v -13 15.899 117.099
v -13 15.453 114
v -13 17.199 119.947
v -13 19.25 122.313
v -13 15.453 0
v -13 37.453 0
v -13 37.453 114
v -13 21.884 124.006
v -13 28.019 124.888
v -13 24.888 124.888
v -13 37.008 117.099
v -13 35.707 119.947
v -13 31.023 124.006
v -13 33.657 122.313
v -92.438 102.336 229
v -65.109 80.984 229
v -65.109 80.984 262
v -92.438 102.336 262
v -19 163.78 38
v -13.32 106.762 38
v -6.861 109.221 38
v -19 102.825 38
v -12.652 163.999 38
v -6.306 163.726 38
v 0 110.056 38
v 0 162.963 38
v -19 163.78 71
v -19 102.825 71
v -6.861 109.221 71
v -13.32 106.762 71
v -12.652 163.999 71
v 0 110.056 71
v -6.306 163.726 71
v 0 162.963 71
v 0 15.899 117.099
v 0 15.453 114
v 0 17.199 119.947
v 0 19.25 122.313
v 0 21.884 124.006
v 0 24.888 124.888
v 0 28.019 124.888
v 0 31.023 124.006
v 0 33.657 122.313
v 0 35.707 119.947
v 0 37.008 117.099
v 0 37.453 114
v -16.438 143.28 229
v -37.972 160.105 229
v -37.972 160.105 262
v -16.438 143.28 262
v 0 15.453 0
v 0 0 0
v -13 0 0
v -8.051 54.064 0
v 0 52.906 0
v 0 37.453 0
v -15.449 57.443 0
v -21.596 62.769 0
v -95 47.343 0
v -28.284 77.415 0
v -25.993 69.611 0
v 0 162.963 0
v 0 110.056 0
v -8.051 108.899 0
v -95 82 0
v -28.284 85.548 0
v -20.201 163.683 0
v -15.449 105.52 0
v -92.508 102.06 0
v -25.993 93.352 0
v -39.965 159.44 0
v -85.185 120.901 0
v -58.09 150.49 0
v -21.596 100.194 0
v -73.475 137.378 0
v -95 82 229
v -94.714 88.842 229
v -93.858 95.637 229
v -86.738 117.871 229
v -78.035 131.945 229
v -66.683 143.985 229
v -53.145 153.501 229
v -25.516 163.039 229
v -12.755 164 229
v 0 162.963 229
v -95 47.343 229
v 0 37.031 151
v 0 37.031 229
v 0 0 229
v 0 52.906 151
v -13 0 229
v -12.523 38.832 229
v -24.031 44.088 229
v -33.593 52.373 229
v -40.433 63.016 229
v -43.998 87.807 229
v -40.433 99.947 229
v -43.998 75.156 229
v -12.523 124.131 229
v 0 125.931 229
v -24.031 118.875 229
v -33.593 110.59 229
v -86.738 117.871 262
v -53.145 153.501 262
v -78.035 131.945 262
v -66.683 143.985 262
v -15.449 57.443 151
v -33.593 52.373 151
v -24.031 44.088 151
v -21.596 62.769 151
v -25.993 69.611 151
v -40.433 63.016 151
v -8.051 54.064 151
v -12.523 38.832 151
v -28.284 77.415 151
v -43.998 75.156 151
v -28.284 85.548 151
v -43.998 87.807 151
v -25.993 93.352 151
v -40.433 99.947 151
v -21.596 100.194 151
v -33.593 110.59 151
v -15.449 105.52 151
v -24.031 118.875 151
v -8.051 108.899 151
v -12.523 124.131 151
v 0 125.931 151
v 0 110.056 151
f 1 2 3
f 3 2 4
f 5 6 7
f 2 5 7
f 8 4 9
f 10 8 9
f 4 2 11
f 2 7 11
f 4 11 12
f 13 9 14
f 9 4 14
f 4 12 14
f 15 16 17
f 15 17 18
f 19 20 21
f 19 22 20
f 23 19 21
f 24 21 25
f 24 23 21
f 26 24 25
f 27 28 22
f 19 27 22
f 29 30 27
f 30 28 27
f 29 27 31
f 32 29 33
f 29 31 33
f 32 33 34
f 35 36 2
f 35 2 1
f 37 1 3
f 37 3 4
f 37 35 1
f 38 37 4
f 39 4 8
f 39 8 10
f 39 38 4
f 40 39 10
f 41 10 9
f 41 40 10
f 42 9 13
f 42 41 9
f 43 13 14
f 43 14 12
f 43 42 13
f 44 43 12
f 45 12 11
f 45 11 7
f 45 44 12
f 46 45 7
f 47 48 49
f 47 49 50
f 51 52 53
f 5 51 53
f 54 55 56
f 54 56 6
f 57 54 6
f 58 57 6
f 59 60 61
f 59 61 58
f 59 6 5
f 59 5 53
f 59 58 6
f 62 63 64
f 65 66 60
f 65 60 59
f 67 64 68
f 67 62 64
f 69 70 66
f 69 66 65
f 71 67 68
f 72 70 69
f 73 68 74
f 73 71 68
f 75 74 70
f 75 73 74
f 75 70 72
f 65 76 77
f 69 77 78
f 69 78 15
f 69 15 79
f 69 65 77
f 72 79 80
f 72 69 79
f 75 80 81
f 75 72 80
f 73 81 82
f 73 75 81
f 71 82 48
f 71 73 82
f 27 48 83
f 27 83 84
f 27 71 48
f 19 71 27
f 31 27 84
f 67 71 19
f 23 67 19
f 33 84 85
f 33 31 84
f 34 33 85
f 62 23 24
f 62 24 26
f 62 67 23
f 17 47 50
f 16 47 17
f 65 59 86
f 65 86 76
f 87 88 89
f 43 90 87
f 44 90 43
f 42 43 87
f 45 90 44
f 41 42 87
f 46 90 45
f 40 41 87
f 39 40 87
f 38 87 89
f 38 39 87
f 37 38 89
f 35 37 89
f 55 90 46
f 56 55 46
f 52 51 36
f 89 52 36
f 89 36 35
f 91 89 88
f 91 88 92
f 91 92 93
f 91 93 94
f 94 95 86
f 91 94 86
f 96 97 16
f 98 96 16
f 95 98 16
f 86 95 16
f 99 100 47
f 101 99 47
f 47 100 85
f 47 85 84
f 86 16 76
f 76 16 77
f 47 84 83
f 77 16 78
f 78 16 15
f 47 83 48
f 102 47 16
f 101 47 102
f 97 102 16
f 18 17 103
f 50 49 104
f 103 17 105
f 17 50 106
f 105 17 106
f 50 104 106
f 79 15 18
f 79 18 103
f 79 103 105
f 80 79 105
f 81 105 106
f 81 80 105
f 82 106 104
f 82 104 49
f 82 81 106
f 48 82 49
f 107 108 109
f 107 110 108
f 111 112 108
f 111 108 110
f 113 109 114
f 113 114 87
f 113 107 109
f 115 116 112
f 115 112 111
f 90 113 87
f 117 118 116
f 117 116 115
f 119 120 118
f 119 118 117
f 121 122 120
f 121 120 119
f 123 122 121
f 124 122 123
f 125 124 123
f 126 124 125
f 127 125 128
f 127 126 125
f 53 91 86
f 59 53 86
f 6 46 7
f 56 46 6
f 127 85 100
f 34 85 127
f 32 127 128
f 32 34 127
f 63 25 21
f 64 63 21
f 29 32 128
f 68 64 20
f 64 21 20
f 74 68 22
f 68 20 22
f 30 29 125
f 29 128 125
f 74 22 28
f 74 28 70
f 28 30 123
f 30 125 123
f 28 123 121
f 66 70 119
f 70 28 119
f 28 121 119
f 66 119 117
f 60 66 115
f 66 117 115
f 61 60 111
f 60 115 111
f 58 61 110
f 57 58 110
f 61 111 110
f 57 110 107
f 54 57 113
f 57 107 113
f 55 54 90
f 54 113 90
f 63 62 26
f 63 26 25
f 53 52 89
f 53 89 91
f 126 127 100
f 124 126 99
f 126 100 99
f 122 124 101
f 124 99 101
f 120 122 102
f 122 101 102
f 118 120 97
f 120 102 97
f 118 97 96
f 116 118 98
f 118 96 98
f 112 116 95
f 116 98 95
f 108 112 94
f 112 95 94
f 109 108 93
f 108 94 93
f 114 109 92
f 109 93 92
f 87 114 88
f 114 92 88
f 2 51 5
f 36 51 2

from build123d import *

# Parameters (mm, degrees)
BOSS_EXTRUDE1_DEPTH     = 229
SKETCH2_R               = 44.45
CUT_EXTRUDE1_DEPTH      = 78
SKETCH3_R               = 28.575
CUT_EXTRUDE2_DEPTH      = 243.326226397
CUT_EXTRUDE3_DEPTH      = 13
BOSS_EXTRUDE2_DEPTH     = 33
CUT_EXTRUDE4_REACH      = 325.365
CUT_EXTRUDE4_END_RADIUS = 28.575
SKETCH7_W               = 19
SKETCH7_H               = 33


with BuildPart() as part:
    # Sketch1 → Boss-Extrude1 (new body)
    with BuildSketch(Plane.XY):
        with BuildLine():
            Line((0, 0), (-13, 0))
            Line((-13, 0), (-95, 47.342722074))
            Line((-95, 47.342722074), (-95, 82))
            ThreePointArc((-95, 82), (-66.188344588, 144.409935107), (0, 162.962954492))
            Line((0, 162.962954492), (0, 0))
        make_face()
    extrude(amount=BOSS_EXTRUDE1_DEPTH)

    # Sketch2 → Cut-Extrude1 (cut)
    with BuildSketch(Plane.XY.offset(229)):
        with Locations((0, 81.481477246)):
            Circle(SKETCH2_R)
    extrude(amount=-CUT_EXTRUDE1_DEPTH, mode=Mode.SUBTRACT)

    # Sketch3 → Cut-Extrude2 (cut, through all)
    with BuildSketch(Plane.XY.offset(151)):
        with Locations((0, 81.481477246)):
            Circle(SKETCH3_R)
    extrude(amount=-CUT_EXTRUDE2_DEPTH, mode=Mode.SUBTRACT)

    # Sketch4 → Cut-Extrude3 (cut)
    with BuildSketch(Plane(origin=(0, 0, 0), x_dir=(0, 0, -1), z_dir=(1, 0, 0))):
        with BuildLine():
            Line((0, 15.453238623), (-114, 15.453238623))
            ThreePointArc((-114, 15.453238623), (-125, 26.453238623), (-114, 37.453238623))
            Line((-114, 37.453238623), (0, 37.453238623))
            ThreePointArc((0, 37.453238623), (11, 26.453238623), (0, 15.453238623))
        make_face()
    extrude(amount=-CUT_EXTRUDE3_DEPTH, mode=Mode.SUBTRACT)

    # Sketch5 → Boss-Extrude2 (add)
    with BuildSketch(Plane.XY.offset(229)):
        with BuildLine():
            Line((-37.972309742, 160.104953404), (-16.437525278, 143.280135832))
            Line((-16.437525278, 143.280135832), (-65.108558458, 80.984054183))
            Line((-65.108558458, 80.984054183), (-92.438236004, 102.336338426))
            ThreePointArc((-92.438236004, 102.336338426), (-72.663168997, 138.25216676), (-37.972309742, 160.104953404))
        make_face()
    extrude(amount=BOSS_EXTRUDE2_DEPTH)

    # Cut-Extrude4: up to this cylinder (the profile starts outside it)
    cut_extrude4_end = Plane(origin=(0, 81.481477246, 54.5), z_dir=(0, 0, 1)) * Cylinder(CUT_EXTRUDE4_END_RADIUS, 708.88, mode=Mode.PRIVATE)
    # Sketch7 → Cut-Extrude4 (cut, up to the surface)
    with BuildSketch(Plane(origin=(0, 164, 0), x_dir=(1, 0, 0), z_dir=(0, 1, 0)), mode=Mode.PRIVATE) as cut_extrude4_sk1:
        with Locations((-9.5, -54.5)):
            Rectangle(SKETCH7_W, SKETCH7_H)
    cut_extrude4_tool1 = extrude(cut_extrude4_sk1.sketch, amount=-CUT_EXTRUDE4_REACH, mode=Mode.PRIVATE) - cut_extrude4_end
    add(cut_extrude4_tool1.solids().sort_by_distance((-9.5, 164, 54.5))[0], mode=Mode.SUBTRACT)


solid = part.part
